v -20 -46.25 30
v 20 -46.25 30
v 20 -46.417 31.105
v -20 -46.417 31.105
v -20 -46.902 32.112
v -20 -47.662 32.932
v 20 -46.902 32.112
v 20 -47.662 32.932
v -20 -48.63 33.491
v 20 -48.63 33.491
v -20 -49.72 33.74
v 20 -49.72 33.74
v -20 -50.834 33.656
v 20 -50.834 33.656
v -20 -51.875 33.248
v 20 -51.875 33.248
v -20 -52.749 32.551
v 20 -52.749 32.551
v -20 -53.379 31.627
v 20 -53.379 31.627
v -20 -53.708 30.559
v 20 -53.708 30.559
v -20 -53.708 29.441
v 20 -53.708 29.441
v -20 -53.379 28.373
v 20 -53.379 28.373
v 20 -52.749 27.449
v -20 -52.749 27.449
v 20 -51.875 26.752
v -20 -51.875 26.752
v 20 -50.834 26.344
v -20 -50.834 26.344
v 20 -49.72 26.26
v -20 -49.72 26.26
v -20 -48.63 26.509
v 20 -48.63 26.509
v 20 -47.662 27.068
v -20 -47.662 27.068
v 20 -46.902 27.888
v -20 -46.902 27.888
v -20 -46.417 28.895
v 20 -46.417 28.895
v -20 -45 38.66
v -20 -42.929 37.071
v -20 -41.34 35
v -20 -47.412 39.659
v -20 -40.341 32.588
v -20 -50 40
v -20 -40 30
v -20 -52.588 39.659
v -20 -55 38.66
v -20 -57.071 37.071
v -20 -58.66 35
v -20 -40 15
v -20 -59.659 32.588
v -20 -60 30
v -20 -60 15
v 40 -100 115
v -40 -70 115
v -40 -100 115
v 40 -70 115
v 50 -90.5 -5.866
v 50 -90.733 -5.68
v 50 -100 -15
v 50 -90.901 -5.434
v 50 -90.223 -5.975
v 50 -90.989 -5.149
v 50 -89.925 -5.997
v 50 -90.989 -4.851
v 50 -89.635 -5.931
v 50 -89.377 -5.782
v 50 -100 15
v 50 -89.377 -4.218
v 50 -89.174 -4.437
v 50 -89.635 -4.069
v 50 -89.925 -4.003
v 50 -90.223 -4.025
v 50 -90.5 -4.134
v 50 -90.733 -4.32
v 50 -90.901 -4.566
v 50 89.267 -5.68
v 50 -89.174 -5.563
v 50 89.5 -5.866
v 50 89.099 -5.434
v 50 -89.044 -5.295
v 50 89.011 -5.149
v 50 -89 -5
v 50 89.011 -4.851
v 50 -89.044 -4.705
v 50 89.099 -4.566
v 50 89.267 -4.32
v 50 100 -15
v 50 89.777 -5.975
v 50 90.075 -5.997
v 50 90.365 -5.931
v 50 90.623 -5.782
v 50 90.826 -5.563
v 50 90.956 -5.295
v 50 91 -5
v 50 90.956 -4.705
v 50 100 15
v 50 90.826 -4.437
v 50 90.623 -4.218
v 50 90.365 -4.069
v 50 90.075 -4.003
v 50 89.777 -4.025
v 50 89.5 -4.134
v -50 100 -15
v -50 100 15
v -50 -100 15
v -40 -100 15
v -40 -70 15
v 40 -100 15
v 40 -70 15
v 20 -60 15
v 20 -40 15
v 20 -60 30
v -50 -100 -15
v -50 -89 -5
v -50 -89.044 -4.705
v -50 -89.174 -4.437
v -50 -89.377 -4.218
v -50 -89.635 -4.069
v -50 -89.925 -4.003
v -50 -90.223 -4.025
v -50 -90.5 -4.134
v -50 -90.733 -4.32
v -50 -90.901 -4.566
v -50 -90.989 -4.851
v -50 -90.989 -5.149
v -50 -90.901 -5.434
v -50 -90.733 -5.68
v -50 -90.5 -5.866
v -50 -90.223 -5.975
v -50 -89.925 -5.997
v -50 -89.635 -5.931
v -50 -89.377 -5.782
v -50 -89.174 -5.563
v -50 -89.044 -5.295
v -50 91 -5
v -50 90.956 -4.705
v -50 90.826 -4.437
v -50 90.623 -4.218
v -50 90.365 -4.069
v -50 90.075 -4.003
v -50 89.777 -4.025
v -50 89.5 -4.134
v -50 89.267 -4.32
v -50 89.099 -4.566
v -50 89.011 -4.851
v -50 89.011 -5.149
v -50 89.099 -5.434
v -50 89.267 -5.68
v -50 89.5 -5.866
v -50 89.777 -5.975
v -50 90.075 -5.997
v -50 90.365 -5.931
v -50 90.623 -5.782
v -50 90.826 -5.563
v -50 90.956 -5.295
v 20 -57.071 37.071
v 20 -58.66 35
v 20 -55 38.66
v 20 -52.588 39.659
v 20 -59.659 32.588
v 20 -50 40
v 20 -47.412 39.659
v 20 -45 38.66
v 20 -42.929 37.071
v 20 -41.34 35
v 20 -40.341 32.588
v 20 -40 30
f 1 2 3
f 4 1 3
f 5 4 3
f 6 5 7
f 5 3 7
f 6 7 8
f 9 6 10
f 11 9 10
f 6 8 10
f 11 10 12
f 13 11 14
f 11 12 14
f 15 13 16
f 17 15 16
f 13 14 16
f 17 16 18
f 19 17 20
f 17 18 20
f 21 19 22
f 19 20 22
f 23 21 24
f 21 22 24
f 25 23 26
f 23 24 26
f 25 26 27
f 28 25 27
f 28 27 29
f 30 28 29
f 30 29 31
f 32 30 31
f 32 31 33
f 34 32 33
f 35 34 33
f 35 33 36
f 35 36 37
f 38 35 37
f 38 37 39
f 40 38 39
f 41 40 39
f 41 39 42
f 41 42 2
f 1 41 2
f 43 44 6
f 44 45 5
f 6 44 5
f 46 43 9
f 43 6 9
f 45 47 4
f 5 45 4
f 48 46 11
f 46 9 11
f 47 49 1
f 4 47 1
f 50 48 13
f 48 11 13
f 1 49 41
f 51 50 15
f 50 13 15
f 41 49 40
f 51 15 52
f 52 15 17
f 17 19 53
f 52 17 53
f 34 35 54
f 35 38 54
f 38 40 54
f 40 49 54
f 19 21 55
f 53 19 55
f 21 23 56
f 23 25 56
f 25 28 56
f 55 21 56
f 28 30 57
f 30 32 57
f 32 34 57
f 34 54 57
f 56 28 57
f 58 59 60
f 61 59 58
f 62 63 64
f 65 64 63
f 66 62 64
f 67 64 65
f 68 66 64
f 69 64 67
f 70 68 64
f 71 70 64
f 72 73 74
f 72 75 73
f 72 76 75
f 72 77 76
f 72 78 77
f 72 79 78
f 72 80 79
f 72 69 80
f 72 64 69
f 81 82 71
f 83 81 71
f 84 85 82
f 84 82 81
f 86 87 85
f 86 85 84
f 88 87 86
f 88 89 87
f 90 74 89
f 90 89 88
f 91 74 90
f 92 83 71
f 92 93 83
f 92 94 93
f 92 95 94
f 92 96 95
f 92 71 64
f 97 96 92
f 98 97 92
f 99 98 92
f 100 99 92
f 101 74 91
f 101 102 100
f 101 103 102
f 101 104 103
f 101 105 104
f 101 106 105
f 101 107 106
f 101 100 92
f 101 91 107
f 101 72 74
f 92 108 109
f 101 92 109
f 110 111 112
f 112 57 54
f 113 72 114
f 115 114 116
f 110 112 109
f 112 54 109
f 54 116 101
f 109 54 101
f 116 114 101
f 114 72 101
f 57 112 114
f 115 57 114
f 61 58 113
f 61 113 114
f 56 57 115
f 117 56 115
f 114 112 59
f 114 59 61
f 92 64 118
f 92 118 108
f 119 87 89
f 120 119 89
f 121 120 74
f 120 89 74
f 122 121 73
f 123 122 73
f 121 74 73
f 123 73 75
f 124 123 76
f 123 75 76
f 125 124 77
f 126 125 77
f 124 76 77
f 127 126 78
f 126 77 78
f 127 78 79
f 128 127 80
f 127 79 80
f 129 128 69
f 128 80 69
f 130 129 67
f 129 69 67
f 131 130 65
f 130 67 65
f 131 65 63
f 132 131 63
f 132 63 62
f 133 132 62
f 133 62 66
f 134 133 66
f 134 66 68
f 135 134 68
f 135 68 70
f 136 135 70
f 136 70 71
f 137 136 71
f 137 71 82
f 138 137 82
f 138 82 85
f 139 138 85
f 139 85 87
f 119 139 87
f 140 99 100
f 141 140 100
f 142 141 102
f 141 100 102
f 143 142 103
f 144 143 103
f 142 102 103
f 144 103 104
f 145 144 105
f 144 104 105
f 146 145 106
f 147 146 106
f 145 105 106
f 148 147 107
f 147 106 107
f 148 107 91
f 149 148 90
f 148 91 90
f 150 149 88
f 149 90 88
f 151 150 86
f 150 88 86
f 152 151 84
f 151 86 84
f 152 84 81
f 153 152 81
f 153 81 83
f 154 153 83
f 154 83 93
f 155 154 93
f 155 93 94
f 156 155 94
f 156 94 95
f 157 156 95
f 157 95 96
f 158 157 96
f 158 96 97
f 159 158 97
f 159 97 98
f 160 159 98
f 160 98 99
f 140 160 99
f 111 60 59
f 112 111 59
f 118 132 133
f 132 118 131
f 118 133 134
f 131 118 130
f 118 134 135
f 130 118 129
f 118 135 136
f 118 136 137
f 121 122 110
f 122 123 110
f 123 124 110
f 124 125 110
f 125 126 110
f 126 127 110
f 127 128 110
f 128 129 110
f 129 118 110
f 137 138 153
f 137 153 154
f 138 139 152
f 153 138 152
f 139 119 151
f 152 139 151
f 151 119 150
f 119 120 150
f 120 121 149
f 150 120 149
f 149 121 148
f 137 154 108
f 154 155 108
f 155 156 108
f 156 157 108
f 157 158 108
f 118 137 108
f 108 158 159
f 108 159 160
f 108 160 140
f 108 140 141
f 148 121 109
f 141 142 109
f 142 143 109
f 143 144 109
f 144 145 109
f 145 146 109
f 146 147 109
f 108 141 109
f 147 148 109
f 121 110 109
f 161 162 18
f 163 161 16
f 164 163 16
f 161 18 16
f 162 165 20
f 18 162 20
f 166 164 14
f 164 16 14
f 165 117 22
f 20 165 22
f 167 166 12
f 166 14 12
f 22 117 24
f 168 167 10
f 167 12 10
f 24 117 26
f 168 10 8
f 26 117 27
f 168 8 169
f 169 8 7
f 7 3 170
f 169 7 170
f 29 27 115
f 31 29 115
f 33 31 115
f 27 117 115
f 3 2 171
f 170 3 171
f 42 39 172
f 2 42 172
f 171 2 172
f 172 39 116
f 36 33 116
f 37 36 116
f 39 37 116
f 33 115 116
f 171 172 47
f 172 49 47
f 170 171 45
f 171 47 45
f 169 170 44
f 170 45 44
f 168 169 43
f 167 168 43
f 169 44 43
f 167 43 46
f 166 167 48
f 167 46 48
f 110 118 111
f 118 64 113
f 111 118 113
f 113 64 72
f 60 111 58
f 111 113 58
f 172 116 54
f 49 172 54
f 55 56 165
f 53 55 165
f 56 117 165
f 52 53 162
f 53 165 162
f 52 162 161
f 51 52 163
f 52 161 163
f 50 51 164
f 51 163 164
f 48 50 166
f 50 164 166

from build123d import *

# Parameters (mm, degrees)
F0_W      = 200
F0_H      = 30
F1_DEPTH  = 50
F2_W      = 80
F2_H      = 30
F3_DEPTH  = 100
F5_DEPTH  = 25
F6_R      = 3.75
F7_DEPTH  = 70.001
F8_R      = 9.99999
F9_R      = 1
F10_DEPTH = 100.001


# Not quite as in the source:
# - a fillet or chamfer is up to 0.001 mm smaller than in the source, because OpenCascade refuses the exact size


with BuildPart() as f1:
    # F0 (on Right) → F1 (new body, symmetric)
    with BuildSketch(Plane.YZ):
        Rectangle(F0_W, F0_H)
    extrude(amount=F1_DEPTH, both=True)

    # F2 (on face) → F3 (join)
    with BuildSketch(Plane.XY.offset(15)):
        with Locations((0, -85)):
            Rectangle(F2_W, F2_H)
    extrude(amount=F3_DEPTH)

    # F4 (on face) → F5 (join)
    with BuildSketch(Plane.XY.offset(15)):
        Polygon((-20, -40), (-20, -60), (0, -60), (20, -60), (20, -40), align=None)
    extrude(amount=F5_DEPTH)

    # F6 (on face) → F7 (cut, through all)
    with BuildSketch(Plane.YZ.offset(20)):
        with Locations((-50, 30)):
            Circle(F6_R)
    extrude(amount=-F7_DEPTH, mode=Mode.SUBTRACT)

    # F8 (radius 10 in the source; OpenCascade refuses exactly that, so slightly less here)
    f8_edges = [f1.edges().sort_by_distance(p)[0] for p in [
        (0, -40, 40),
        (0, -60, 40),
    ]]
    fillet(f8_edges, radius=F8_R)

    # F9 (on face) → F10 (cut, through all)
    with BuildSketch(Plane.YZ.offset(50)):
        with Locations((90, -5)):
            Circle(F9_R)
        with Locations((-90, -5)):
            Circle(F9_R)
    extrude(amount=-F10_DEPTH, mode=Mode.SUBTRACT)


solid = f1.part
